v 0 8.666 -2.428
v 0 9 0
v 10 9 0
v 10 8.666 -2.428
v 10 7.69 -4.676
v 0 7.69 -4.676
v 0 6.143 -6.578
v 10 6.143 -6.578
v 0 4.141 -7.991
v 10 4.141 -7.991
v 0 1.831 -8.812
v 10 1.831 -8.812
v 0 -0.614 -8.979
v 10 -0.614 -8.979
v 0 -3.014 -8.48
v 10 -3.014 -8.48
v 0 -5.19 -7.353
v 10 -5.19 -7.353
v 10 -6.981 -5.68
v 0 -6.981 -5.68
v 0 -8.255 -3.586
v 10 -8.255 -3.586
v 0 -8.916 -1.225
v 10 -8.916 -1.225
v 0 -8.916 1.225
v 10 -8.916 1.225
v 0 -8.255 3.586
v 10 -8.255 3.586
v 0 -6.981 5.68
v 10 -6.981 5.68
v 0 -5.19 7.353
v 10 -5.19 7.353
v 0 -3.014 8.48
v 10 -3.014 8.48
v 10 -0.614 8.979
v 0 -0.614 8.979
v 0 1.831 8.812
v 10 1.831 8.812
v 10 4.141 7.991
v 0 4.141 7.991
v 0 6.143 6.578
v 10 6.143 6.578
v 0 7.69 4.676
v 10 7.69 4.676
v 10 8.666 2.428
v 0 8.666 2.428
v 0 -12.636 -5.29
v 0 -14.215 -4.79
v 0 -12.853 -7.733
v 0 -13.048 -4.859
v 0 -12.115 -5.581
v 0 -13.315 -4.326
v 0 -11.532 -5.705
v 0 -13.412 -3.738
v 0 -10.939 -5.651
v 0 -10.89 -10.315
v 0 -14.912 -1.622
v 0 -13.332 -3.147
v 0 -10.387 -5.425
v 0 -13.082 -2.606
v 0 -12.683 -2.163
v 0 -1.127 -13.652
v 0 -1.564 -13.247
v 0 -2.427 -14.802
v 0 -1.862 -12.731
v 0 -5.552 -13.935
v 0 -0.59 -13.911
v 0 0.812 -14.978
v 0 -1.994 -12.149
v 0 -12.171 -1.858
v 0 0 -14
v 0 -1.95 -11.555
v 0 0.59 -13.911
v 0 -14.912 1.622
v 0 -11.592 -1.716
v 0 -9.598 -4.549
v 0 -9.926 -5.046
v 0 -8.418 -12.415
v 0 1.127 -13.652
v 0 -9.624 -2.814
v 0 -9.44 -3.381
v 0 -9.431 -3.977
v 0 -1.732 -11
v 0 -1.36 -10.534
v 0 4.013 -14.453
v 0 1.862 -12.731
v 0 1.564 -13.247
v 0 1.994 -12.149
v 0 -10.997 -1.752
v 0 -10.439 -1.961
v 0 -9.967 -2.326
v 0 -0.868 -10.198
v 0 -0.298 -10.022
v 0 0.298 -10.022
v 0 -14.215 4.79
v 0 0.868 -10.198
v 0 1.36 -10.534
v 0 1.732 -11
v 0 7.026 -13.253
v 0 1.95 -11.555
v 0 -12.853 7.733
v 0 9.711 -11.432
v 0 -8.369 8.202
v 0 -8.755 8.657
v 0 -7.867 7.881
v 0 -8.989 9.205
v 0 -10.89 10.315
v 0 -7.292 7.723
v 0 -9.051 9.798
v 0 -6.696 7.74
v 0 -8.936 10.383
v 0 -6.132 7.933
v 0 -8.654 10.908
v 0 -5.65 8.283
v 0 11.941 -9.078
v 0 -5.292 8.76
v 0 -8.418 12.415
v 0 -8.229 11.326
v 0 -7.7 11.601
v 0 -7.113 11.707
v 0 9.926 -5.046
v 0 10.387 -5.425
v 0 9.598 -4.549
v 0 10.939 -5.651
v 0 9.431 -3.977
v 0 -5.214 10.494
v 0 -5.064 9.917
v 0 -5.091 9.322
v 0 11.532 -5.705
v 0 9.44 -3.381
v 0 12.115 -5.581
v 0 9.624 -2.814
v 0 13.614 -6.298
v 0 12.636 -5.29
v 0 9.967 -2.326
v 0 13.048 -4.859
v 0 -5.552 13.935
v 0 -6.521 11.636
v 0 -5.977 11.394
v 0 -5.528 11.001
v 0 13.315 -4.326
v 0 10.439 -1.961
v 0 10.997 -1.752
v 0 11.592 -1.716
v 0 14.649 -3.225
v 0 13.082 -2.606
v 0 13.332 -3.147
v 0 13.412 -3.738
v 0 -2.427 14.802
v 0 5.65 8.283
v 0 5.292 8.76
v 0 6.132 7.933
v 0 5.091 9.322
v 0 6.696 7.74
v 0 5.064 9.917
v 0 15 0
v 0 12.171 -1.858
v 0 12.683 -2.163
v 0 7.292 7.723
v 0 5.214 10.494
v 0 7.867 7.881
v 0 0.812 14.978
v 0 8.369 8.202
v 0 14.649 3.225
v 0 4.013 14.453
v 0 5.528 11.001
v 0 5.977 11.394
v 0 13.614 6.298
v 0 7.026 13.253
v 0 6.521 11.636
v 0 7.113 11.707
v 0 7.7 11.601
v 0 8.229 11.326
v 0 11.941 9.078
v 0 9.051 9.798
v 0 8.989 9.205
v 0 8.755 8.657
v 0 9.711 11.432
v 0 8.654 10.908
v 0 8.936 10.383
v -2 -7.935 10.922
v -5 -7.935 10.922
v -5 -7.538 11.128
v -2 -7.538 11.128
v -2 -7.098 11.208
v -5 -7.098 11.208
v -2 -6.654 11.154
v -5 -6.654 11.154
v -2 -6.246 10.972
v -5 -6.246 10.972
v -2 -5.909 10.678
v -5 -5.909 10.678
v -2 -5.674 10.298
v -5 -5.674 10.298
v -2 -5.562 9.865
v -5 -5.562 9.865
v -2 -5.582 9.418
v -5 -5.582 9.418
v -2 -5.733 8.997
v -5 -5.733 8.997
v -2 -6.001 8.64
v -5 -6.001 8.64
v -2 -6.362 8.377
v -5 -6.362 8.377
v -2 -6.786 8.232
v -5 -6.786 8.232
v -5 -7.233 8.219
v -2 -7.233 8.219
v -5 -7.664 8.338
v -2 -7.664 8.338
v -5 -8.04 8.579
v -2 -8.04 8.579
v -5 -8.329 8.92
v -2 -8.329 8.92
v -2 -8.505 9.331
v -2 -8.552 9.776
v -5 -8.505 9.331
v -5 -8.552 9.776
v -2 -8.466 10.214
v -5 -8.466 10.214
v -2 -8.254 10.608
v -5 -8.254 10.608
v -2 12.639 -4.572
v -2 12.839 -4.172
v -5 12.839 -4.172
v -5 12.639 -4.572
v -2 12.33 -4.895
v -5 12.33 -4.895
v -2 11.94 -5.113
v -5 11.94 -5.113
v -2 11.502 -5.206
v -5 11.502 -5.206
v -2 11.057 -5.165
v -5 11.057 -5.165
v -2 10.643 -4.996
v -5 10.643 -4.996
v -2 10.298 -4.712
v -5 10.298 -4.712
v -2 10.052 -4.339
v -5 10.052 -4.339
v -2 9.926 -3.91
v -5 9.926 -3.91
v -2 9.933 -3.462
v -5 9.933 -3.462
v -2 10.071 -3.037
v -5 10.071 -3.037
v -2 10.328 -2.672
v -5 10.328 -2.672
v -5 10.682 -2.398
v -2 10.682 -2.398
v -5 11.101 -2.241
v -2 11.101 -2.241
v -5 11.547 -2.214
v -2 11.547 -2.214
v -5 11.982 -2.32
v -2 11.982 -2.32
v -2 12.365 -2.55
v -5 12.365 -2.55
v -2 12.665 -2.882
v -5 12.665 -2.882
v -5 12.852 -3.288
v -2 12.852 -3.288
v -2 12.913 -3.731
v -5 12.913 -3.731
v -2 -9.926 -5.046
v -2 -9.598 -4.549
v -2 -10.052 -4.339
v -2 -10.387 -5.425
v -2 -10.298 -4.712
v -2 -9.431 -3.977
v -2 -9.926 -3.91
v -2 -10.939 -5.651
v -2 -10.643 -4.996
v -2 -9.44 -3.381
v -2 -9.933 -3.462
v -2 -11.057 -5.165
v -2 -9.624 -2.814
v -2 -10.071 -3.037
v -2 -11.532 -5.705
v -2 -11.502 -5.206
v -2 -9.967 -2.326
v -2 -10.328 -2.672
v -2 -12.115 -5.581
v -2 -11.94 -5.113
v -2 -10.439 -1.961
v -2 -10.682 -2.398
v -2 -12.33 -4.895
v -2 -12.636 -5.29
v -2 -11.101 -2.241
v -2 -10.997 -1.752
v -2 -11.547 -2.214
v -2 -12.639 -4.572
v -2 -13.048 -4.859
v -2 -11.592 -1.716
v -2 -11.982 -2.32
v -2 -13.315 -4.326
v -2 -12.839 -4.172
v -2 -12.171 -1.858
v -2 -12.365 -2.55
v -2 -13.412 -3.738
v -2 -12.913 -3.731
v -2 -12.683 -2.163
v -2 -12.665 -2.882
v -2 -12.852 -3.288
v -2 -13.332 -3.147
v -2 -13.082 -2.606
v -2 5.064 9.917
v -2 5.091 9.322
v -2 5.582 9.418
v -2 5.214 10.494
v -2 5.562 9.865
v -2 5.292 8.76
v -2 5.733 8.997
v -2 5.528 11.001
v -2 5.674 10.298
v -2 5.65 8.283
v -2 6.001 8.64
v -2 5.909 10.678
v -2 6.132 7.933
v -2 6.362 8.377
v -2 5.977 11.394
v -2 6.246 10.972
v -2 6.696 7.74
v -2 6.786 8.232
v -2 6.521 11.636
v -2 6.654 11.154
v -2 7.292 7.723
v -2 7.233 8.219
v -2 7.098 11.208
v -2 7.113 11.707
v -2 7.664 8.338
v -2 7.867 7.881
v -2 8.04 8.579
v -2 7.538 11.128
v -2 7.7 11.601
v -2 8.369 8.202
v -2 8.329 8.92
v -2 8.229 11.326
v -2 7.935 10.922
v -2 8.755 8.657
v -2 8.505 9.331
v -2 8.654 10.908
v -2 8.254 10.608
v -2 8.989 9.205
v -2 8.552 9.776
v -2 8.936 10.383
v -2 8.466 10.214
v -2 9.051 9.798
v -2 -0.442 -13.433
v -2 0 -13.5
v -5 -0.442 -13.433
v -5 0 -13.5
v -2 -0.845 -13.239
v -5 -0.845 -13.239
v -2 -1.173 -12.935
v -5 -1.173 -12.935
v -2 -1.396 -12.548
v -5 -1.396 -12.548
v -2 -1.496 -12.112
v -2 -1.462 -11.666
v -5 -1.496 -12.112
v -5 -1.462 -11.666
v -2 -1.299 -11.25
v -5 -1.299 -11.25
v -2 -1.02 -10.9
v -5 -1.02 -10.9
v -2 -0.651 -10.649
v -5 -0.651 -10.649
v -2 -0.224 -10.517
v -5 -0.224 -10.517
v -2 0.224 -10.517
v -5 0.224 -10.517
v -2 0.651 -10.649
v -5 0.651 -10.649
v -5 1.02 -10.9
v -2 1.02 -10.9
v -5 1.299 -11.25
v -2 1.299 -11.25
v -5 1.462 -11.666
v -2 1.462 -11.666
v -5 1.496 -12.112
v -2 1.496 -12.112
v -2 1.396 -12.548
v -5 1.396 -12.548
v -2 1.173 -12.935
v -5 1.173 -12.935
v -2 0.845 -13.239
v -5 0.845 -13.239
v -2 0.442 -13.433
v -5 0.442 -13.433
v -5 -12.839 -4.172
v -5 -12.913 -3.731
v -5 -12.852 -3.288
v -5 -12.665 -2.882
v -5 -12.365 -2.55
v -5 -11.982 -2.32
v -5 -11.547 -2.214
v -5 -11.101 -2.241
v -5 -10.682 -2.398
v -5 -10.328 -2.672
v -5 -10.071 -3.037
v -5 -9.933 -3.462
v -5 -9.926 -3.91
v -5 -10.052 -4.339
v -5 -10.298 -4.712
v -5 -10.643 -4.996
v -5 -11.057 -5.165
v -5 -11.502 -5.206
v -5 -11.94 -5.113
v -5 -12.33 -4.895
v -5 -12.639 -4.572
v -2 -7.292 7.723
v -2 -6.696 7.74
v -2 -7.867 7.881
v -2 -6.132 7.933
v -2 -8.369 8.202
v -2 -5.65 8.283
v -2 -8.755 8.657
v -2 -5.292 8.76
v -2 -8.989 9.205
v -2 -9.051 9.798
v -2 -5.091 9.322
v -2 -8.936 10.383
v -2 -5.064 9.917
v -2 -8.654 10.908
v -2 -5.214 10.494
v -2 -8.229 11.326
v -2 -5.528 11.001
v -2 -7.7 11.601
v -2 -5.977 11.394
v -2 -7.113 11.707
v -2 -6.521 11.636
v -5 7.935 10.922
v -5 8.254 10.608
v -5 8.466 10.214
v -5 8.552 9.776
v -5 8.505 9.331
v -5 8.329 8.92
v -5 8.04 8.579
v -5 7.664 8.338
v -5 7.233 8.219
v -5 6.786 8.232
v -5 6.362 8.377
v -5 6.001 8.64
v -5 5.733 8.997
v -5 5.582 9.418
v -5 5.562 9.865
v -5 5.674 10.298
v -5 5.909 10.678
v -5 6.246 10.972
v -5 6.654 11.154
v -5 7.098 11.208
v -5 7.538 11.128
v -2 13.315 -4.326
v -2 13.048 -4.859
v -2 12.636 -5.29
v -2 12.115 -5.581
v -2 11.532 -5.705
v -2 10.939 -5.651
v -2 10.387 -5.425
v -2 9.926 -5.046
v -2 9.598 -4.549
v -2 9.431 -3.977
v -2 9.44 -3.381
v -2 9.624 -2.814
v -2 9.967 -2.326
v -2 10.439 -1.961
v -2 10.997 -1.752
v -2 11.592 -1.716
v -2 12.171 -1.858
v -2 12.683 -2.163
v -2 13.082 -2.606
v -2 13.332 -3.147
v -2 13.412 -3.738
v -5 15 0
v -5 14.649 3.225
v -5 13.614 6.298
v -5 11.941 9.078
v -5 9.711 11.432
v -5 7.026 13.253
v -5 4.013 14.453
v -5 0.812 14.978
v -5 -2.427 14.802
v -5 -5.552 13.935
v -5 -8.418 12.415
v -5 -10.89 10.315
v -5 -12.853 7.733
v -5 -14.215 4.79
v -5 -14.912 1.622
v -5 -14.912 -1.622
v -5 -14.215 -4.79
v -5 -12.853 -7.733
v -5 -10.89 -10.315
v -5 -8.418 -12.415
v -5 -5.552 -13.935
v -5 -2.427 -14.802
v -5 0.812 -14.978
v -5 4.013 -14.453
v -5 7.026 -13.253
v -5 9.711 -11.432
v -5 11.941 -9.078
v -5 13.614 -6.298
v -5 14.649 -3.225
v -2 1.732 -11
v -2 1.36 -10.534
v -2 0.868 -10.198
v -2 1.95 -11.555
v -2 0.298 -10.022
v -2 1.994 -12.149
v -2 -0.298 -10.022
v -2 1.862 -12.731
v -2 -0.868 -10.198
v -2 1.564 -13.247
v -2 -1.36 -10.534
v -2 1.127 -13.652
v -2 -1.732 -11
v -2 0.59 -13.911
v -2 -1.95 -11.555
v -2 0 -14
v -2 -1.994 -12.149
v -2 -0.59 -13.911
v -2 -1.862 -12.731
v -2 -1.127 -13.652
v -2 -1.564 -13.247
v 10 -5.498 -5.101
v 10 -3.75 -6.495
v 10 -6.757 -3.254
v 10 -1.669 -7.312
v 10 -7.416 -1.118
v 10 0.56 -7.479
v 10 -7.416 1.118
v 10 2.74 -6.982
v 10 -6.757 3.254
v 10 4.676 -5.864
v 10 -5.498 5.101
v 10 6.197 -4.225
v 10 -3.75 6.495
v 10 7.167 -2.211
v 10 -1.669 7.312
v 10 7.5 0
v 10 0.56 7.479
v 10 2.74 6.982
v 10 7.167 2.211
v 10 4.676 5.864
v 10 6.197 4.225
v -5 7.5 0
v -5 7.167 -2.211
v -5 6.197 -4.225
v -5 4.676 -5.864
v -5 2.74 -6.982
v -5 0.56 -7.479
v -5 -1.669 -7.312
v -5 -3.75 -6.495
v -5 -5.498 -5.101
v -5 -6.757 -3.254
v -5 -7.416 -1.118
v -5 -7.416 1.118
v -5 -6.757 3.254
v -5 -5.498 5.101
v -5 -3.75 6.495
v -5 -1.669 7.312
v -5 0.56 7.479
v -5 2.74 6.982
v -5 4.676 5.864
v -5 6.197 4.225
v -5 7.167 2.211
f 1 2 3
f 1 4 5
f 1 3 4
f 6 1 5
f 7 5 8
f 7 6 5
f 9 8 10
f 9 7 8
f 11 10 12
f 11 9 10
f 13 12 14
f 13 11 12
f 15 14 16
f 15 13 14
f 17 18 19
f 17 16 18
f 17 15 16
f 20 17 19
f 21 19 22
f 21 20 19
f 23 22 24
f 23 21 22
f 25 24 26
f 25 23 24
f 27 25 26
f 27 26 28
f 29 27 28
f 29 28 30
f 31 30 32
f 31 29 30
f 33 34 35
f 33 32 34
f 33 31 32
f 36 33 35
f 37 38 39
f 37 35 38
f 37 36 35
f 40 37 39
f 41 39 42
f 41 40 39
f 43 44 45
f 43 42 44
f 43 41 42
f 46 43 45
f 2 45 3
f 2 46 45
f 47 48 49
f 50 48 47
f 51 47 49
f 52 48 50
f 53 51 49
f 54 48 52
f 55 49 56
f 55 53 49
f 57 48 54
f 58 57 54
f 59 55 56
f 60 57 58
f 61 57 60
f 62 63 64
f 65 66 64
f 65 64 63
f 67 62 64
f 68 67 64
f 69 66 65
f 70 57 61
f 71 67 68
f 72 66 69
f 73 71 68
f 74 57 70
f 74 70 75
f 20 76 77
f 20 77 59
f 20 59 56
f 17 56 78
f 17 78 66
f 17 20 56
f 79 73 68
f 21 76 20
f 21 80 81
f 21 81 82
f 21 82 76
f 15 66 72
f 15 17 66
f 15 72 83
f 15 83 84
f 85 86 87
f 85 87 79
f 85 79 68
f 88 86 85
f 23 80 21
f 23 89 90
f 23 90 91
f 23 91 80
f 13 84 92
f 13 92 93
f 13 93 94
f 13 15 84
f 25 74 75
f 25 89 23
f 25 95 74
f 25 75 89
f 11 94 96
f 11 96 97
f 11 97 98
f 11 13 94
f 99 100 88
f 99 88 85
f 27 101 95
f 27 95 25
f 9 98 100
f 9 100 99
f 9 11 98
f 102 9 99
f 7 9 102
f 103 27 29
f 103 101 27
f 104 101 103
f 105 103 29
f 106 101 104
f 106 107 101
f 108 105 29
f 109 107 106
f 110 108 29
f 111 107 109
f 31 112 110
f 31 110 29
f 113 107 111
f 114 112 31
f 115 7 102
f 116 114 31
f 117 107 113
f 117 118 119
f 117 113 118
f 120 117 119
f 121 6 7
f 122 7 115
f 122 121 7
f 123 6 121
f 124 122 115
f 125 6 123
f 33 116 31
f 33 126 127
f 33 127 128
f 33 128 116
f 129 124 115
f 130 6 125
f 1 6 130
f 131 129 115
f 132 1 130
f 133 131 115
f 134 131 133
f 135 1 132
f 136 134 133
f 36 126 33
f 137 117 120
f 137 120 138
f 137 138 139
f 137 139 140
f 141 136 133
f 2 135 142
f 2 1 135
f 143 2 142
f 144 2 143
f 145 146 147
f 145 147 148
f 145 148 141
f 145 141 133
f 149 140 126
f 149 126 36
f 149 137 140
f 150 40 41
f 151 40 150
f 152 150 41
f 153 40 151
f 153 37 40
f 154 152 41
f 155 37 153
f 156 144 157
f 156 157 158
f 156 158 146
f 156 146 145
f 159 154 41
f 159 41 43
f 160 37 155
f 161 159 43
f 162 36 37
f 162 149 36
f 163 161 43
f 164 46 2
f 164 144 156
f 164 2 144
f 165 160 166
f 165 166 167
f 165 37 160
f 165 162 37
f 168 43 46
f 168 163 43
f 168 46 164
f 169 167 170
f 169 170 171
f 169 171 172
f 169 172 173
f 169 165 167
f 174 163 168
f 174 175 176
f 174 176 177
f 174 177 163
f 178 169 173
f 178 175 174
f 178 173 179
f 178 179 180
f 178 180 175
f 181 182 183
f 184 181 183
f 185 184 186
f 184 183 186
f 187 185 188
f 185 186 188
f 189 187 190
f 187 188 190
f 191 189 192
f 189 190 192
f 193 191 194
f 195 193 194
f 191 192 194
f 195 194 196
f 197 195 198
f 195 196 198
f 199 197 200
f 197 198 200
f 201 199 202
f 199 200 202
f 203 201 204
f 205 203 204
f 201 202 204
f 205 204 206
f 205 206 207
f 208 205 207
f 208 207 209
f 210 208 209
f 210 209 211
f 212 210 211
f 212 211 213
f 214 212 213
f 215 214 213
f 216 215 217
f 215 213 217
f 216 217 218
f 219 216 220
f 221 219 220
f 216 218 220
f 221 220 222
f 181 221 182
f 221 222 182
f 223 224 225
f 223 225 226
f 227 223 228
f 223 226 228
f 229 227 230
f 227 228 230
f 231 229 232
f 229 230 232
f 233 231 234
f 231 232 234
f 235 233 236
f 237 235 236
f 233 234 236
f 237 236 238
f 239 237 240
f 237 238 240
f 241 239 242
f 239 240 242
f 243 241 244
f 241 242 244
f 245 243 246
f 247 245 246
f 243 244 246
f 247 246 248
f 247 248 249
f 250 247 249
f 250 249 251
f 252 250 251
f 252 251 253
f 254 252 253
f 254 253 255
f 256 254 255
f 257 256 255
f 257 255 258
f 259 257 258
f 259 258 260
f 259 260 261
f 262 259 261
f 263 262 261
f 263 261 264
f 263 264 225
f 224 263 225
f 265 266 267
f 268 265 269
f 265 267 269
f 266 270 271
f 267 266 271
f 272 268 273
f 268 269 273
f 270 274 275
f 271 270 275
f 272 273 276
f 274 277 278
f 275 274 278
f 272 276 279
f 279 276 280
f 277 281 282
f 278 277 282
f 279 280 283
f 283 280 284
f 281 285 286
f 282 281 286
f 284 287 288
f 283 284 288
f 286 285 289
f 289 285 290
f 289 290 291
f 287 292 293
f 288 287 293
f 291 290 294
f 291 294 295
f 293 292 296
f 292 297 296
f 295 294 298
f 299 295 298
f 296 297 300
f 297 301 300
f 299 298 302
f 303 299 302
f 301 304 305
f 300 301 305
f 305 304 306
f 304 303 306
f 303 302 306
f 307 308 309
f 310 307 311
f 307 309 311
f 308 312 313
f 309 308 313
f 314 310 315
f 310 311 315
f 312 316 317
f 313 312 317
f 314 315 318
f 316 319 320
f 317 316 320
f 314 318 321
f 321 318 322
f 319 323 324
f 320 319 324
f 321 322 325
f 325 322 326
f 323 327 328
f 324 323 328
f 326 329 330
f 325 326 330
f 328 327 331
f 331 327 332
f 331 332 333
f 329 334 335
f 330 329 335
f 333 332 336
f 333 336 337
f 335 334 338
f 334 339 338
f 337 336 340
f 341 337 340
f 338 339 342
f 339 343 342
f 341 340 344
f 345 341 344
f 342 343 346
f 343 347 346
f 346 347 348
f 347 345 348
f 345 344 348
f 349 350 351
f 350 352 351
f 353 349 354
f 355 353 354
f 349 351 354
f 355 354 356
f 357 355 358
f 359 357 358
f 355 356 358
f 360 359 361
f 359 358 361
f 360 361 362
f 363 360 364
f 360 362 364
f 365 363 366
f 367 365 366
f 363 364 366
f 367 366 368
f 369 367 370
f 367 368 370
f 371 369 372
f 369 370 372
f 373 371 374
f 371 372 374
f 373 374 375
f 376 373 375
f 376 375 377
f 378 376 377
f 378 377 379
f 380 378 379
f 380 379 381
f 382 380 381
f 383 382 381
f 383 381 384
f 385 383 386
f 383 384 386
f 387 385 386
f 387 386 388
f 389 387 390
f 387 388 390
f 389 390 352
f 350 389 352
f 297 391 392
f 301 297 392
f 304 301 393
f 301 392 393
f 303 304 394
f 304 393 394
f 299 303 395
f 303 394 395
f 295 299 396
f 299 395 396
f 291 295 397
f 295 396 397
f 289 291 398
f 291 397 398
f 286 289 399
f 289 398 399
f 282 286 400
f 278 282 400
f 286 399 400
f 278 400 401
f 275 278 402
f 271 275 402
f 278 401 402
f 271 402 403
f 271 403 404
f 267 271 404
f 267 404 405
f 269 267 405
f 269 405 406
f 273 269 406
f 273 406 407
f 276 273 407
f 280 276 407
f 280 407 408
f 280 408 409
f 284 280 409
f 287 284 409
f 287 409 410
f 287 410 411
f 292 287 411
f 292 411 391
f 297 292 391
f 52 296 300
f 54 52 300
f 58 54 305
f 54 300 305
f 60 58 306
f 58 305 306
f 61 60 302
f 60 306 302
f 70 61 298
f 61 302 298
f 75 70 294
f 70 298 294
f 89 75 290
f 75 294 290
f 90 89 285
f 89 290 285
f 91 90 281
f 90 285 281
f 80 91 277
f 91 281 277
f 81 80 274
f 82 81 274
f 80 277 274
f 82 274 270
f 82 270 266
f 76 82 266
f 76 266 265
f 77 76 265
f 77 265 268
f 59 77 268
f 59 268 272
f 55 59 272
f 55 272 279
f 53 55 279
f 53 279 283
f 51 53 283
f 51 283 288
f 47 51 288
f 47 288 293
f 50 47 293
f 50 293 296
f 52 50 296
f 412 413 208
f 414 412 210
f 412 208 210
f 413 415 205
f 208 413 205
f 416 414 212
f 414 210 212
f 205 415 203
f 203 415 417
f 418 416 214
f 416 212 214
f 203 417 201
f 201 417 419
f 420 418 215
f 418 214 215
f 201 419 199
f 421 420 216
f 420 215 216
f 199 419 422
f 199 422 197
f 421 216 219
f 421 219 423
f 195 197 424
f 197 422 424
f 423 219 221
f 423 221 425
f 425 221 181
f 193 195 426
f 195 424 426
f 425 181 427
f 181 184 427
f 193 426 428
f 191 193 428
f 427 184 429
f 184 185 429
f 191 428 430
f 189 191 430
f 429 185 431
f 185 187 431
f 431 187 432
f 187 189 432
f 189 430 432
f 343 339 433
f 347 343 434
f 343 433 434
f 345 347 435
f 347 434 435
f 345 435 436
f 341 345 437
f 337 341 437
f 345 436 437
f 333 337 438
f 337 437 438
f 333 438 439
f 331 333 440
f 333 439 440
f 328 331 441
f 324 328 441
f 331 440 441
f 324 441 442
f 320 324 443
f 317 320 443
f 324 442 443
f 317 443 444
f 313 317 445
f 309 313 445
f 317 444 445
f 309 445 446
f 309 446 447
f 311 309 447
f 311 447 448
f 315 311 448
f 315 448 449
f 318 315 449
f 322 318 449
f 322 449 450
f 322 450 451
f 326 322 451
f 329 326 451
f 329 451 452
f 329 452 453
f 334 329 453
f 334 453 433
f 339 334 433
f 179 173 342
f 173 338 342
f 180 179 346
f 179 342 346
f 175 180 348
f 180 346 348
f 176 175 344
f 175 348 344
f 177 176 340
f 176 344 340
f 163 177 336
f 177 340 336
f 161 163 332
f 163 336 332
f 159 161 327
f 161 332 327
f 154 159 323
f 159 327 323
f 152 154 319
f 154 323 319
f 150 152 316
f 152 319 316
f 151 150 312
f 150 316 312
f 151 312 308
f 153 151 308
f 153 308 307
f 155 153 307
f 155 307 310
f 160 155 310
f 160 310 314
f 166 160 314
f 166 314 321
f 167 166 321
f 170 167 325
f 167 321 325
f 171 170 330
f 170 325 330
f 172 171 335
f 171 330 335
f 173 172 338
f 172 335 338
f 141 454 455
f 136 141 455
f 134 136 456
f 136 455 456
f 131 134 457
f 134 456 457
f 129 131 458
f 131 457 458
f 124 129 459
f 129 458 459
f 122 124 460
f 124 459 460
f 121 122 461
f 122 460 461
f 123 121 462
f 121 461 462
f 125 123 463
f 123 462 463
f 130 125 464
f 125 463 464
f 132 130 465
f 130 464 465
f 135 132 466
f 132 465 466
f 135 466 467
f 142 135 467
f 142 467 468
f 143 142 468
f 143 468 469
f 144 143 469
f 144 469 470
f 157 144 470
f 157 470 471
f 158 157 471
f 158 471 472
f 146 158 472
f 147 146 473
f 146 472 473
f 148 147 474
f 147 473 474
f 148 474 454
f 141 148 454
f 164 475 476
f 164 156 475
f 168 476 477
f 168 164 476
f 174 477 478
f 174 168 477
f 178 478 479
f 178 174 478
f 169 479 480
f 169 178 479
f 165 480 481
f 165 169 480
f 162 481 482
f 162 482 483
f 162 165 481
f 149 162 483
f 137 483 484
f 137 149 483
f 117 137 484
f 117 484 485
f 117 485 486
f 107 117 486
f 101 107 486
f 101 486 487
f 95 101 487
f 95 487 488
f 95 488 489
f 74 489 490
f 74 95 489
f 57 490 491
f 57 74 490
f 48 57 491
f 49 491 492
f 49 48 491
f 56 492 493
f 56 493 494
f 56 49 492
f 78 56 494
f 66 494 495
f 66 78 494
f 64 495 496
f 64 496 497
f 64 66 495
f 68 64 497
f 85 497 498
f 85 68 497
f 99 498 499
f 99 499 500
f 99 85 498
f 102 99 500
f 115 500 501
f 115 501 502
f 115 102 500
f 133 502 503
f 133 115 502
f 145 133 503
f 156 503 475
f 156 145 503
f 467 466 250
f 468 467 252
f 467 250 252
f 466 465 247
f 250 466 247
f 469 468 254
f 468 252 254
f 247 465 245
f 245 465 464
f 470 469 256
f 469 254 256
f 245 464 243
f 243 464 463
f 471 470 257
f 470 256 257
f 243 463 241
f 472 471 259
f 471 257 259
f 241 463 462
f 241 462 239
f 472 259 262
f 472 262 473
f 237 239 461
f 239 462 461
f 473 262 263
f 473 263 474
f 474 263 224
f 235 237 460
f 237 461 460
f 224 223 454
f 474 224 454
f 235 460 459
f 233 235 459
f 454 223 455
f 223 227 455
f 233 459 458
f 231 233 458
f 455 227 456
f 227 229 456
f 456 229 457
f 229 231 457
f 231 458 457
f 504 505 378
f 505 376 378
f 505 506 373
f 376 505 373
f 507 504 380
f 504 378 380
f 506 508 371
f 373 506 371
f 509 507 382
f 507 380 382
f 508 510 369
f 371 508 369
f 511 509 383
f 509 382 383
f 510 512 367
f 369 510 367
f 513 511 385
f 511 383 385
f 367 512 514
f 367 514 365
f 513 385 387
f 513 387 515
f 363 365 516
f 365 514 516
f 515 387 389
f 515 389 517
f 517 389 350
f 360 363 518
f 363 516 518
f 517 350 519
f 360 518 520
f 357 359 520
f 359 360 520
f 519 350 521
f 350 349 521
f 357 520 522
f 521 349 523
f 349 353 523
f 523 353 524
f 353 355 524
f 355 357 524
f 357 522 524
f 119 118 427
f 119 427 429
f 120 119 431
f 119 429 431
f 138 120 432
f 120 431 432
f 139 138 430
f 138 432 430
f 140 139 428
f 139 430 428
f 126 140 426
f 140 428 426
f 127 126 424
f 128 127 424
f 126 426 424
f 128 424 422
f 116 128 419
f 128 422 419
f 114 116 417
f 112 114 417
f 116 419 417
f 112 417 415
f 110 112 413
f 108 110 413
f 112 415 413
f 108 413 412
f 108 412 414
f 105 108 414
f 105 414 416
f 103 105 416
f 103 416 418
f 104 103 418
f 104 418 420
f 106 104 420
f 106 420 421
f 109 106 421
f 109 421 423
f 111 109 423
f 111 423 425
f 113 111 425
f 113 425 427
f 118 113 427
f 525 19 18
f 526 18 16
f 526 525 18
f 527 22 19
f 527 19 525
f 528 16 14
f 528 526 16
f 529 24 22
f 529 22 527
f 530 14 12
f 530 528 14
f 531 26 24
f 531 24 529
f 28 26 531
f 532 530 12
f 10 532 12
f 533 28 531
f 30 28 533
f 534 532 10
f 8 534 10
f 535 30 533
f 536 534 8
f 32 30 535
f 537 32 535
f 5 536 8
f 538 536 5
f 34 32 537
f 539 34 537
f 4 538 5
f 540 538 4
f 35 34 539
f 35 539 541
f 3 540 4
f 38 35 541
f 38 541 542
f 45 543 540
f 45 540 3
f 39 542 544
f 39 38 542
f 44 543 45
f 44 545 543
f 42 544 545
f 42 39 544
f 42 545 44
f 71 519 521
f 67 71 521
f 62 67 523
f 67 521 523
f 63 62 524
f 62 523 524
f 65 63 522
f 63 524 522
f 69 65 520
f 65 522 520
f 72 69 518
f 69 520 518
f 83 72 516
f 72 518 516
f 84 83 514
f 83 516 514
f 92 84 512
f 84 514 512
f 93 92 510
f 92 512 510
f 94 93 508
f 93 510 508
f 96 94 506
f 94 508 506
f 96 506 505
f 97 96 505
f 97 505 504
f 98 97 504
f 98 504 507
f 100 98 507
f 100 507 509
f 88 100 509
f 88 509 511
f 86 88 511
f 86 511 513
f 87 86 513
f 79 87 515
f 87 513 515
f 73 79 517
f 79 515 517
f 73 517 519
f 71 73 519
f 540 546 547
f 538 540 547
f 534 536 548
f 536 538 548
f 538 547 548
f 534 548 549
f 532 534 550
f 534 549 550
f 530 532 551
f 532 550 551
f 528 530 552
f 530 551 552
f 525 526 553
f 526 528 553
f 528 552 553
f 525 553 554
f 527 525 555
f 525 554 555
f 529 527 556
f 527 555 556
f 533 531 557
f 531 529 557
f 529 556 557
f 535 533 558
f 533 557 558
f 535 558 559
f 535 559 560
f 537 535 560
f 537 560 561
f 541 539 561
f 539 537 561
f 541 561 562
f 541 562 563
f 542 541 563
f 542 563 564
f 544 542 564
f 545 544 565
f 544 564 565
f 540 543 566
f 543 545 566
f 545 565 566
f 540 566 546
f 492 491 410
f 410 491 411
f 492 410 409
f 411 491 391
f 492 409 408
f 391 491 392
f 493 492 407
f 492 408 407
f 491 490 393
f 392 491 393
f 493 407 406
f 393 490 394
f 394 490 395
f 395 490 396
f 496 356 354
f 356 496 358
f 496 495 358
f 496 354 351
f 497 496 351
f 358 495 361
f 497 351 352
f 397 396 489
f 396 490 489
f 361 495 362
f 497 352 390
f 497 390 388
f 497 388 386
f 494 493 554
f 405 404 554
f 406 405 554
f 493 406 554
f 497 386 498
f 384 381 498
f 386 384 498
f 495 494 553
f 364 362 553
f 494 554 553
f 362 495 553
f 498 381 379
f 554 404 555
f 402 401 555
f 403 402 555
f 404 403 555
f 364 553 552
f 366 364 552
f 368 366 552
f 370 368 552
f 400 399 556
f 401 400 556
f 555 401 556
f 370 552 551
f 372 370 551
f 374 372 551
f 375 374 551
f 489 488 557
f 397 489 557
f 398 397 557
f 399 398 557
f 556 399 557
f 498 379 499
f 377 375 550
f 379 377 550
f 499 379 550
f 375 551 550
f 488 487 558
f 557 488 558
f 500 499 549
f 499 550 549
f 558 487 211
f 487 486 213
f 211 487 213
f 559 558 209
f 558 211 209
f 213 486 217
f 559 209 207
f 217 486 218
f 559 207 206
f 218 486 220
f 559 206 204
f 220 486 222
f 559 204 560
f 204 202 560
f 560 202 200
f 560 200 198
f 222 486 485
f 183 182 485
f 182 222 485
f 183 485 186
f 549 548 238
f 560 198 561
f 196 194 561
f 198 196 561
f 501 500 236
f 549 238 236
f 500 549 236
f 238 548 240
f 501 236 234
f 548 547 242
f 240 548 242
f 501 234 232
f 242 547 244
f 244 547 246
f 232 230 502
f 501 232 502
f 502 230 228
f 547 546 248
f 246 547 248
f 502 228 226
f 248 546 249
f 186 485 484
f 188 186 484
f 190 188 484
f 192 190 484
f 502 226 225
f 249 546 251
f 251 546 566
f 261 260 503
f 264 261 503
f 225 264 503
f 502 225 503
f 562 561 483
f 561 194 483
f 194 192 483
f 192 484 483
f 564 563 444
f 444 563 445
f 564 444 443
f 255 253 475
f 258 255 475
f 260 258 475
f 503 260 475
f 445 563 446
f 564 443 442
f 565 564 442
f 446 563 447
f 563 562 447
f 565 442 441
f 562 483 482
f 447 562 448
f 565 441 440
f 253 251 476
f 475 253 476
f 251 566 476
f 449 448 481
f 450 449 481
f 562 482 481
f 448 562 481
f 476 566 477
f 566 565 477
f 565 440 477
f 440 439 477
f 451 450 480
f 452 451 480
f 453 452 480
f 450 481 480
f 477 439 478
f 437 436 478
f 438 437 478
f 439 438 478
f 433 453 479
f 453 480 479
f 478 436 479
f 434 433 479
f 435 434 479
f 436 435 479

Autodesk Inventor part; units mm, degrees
ref_plane "YZ Plane" through (0, 0, 0) normal (1, 0, 0) x (0, 1, 0)
ref_plane "XZ Plane" through (0, 0, 0) normal (0, 1, 0) x (-1, 0, 0)
ref_plane "XY Plane" through (0, 0, 0) normal (0, 0, 1) x (1, 0, 0)
sketch "Sketch1" plane through (0, 0, 0) normal (1, 0, 0) x (0, 1, 0)
  circle A0 centre (0, 0) radius 7.5
  circle A1 centre (0, 0) radius 9
  circle A2 centre (0, 0) radius 15
  dimension "d0" = 15
  dimension "d1" = 18
  dimension "d2" = 30
extrude "Extrusion1" add sketch "Sketch1" against normal blind 5 contours A1 | A2
extrude "Extrusion2" add sketch "Sketch1" along normal blind 10 contours A1
sketch "Sketch2" plane through (0, 0, 0) normal (1, 0, 0) x (0, 0, -1)
  point P0 (0, 0)
  point P1 (12, 0)
  dimension "d7" = 12
hole "Hole1" at (0, 0, -12) direction (-1, 0, 0) diameter 3 end through all counterbore diameter 4 counterbore depth 2
pattern_circular "Circular Pattern1" count 5 over 360 about axis through (0, 0, 0) along (-1, 0, 0) of "Hole1"
